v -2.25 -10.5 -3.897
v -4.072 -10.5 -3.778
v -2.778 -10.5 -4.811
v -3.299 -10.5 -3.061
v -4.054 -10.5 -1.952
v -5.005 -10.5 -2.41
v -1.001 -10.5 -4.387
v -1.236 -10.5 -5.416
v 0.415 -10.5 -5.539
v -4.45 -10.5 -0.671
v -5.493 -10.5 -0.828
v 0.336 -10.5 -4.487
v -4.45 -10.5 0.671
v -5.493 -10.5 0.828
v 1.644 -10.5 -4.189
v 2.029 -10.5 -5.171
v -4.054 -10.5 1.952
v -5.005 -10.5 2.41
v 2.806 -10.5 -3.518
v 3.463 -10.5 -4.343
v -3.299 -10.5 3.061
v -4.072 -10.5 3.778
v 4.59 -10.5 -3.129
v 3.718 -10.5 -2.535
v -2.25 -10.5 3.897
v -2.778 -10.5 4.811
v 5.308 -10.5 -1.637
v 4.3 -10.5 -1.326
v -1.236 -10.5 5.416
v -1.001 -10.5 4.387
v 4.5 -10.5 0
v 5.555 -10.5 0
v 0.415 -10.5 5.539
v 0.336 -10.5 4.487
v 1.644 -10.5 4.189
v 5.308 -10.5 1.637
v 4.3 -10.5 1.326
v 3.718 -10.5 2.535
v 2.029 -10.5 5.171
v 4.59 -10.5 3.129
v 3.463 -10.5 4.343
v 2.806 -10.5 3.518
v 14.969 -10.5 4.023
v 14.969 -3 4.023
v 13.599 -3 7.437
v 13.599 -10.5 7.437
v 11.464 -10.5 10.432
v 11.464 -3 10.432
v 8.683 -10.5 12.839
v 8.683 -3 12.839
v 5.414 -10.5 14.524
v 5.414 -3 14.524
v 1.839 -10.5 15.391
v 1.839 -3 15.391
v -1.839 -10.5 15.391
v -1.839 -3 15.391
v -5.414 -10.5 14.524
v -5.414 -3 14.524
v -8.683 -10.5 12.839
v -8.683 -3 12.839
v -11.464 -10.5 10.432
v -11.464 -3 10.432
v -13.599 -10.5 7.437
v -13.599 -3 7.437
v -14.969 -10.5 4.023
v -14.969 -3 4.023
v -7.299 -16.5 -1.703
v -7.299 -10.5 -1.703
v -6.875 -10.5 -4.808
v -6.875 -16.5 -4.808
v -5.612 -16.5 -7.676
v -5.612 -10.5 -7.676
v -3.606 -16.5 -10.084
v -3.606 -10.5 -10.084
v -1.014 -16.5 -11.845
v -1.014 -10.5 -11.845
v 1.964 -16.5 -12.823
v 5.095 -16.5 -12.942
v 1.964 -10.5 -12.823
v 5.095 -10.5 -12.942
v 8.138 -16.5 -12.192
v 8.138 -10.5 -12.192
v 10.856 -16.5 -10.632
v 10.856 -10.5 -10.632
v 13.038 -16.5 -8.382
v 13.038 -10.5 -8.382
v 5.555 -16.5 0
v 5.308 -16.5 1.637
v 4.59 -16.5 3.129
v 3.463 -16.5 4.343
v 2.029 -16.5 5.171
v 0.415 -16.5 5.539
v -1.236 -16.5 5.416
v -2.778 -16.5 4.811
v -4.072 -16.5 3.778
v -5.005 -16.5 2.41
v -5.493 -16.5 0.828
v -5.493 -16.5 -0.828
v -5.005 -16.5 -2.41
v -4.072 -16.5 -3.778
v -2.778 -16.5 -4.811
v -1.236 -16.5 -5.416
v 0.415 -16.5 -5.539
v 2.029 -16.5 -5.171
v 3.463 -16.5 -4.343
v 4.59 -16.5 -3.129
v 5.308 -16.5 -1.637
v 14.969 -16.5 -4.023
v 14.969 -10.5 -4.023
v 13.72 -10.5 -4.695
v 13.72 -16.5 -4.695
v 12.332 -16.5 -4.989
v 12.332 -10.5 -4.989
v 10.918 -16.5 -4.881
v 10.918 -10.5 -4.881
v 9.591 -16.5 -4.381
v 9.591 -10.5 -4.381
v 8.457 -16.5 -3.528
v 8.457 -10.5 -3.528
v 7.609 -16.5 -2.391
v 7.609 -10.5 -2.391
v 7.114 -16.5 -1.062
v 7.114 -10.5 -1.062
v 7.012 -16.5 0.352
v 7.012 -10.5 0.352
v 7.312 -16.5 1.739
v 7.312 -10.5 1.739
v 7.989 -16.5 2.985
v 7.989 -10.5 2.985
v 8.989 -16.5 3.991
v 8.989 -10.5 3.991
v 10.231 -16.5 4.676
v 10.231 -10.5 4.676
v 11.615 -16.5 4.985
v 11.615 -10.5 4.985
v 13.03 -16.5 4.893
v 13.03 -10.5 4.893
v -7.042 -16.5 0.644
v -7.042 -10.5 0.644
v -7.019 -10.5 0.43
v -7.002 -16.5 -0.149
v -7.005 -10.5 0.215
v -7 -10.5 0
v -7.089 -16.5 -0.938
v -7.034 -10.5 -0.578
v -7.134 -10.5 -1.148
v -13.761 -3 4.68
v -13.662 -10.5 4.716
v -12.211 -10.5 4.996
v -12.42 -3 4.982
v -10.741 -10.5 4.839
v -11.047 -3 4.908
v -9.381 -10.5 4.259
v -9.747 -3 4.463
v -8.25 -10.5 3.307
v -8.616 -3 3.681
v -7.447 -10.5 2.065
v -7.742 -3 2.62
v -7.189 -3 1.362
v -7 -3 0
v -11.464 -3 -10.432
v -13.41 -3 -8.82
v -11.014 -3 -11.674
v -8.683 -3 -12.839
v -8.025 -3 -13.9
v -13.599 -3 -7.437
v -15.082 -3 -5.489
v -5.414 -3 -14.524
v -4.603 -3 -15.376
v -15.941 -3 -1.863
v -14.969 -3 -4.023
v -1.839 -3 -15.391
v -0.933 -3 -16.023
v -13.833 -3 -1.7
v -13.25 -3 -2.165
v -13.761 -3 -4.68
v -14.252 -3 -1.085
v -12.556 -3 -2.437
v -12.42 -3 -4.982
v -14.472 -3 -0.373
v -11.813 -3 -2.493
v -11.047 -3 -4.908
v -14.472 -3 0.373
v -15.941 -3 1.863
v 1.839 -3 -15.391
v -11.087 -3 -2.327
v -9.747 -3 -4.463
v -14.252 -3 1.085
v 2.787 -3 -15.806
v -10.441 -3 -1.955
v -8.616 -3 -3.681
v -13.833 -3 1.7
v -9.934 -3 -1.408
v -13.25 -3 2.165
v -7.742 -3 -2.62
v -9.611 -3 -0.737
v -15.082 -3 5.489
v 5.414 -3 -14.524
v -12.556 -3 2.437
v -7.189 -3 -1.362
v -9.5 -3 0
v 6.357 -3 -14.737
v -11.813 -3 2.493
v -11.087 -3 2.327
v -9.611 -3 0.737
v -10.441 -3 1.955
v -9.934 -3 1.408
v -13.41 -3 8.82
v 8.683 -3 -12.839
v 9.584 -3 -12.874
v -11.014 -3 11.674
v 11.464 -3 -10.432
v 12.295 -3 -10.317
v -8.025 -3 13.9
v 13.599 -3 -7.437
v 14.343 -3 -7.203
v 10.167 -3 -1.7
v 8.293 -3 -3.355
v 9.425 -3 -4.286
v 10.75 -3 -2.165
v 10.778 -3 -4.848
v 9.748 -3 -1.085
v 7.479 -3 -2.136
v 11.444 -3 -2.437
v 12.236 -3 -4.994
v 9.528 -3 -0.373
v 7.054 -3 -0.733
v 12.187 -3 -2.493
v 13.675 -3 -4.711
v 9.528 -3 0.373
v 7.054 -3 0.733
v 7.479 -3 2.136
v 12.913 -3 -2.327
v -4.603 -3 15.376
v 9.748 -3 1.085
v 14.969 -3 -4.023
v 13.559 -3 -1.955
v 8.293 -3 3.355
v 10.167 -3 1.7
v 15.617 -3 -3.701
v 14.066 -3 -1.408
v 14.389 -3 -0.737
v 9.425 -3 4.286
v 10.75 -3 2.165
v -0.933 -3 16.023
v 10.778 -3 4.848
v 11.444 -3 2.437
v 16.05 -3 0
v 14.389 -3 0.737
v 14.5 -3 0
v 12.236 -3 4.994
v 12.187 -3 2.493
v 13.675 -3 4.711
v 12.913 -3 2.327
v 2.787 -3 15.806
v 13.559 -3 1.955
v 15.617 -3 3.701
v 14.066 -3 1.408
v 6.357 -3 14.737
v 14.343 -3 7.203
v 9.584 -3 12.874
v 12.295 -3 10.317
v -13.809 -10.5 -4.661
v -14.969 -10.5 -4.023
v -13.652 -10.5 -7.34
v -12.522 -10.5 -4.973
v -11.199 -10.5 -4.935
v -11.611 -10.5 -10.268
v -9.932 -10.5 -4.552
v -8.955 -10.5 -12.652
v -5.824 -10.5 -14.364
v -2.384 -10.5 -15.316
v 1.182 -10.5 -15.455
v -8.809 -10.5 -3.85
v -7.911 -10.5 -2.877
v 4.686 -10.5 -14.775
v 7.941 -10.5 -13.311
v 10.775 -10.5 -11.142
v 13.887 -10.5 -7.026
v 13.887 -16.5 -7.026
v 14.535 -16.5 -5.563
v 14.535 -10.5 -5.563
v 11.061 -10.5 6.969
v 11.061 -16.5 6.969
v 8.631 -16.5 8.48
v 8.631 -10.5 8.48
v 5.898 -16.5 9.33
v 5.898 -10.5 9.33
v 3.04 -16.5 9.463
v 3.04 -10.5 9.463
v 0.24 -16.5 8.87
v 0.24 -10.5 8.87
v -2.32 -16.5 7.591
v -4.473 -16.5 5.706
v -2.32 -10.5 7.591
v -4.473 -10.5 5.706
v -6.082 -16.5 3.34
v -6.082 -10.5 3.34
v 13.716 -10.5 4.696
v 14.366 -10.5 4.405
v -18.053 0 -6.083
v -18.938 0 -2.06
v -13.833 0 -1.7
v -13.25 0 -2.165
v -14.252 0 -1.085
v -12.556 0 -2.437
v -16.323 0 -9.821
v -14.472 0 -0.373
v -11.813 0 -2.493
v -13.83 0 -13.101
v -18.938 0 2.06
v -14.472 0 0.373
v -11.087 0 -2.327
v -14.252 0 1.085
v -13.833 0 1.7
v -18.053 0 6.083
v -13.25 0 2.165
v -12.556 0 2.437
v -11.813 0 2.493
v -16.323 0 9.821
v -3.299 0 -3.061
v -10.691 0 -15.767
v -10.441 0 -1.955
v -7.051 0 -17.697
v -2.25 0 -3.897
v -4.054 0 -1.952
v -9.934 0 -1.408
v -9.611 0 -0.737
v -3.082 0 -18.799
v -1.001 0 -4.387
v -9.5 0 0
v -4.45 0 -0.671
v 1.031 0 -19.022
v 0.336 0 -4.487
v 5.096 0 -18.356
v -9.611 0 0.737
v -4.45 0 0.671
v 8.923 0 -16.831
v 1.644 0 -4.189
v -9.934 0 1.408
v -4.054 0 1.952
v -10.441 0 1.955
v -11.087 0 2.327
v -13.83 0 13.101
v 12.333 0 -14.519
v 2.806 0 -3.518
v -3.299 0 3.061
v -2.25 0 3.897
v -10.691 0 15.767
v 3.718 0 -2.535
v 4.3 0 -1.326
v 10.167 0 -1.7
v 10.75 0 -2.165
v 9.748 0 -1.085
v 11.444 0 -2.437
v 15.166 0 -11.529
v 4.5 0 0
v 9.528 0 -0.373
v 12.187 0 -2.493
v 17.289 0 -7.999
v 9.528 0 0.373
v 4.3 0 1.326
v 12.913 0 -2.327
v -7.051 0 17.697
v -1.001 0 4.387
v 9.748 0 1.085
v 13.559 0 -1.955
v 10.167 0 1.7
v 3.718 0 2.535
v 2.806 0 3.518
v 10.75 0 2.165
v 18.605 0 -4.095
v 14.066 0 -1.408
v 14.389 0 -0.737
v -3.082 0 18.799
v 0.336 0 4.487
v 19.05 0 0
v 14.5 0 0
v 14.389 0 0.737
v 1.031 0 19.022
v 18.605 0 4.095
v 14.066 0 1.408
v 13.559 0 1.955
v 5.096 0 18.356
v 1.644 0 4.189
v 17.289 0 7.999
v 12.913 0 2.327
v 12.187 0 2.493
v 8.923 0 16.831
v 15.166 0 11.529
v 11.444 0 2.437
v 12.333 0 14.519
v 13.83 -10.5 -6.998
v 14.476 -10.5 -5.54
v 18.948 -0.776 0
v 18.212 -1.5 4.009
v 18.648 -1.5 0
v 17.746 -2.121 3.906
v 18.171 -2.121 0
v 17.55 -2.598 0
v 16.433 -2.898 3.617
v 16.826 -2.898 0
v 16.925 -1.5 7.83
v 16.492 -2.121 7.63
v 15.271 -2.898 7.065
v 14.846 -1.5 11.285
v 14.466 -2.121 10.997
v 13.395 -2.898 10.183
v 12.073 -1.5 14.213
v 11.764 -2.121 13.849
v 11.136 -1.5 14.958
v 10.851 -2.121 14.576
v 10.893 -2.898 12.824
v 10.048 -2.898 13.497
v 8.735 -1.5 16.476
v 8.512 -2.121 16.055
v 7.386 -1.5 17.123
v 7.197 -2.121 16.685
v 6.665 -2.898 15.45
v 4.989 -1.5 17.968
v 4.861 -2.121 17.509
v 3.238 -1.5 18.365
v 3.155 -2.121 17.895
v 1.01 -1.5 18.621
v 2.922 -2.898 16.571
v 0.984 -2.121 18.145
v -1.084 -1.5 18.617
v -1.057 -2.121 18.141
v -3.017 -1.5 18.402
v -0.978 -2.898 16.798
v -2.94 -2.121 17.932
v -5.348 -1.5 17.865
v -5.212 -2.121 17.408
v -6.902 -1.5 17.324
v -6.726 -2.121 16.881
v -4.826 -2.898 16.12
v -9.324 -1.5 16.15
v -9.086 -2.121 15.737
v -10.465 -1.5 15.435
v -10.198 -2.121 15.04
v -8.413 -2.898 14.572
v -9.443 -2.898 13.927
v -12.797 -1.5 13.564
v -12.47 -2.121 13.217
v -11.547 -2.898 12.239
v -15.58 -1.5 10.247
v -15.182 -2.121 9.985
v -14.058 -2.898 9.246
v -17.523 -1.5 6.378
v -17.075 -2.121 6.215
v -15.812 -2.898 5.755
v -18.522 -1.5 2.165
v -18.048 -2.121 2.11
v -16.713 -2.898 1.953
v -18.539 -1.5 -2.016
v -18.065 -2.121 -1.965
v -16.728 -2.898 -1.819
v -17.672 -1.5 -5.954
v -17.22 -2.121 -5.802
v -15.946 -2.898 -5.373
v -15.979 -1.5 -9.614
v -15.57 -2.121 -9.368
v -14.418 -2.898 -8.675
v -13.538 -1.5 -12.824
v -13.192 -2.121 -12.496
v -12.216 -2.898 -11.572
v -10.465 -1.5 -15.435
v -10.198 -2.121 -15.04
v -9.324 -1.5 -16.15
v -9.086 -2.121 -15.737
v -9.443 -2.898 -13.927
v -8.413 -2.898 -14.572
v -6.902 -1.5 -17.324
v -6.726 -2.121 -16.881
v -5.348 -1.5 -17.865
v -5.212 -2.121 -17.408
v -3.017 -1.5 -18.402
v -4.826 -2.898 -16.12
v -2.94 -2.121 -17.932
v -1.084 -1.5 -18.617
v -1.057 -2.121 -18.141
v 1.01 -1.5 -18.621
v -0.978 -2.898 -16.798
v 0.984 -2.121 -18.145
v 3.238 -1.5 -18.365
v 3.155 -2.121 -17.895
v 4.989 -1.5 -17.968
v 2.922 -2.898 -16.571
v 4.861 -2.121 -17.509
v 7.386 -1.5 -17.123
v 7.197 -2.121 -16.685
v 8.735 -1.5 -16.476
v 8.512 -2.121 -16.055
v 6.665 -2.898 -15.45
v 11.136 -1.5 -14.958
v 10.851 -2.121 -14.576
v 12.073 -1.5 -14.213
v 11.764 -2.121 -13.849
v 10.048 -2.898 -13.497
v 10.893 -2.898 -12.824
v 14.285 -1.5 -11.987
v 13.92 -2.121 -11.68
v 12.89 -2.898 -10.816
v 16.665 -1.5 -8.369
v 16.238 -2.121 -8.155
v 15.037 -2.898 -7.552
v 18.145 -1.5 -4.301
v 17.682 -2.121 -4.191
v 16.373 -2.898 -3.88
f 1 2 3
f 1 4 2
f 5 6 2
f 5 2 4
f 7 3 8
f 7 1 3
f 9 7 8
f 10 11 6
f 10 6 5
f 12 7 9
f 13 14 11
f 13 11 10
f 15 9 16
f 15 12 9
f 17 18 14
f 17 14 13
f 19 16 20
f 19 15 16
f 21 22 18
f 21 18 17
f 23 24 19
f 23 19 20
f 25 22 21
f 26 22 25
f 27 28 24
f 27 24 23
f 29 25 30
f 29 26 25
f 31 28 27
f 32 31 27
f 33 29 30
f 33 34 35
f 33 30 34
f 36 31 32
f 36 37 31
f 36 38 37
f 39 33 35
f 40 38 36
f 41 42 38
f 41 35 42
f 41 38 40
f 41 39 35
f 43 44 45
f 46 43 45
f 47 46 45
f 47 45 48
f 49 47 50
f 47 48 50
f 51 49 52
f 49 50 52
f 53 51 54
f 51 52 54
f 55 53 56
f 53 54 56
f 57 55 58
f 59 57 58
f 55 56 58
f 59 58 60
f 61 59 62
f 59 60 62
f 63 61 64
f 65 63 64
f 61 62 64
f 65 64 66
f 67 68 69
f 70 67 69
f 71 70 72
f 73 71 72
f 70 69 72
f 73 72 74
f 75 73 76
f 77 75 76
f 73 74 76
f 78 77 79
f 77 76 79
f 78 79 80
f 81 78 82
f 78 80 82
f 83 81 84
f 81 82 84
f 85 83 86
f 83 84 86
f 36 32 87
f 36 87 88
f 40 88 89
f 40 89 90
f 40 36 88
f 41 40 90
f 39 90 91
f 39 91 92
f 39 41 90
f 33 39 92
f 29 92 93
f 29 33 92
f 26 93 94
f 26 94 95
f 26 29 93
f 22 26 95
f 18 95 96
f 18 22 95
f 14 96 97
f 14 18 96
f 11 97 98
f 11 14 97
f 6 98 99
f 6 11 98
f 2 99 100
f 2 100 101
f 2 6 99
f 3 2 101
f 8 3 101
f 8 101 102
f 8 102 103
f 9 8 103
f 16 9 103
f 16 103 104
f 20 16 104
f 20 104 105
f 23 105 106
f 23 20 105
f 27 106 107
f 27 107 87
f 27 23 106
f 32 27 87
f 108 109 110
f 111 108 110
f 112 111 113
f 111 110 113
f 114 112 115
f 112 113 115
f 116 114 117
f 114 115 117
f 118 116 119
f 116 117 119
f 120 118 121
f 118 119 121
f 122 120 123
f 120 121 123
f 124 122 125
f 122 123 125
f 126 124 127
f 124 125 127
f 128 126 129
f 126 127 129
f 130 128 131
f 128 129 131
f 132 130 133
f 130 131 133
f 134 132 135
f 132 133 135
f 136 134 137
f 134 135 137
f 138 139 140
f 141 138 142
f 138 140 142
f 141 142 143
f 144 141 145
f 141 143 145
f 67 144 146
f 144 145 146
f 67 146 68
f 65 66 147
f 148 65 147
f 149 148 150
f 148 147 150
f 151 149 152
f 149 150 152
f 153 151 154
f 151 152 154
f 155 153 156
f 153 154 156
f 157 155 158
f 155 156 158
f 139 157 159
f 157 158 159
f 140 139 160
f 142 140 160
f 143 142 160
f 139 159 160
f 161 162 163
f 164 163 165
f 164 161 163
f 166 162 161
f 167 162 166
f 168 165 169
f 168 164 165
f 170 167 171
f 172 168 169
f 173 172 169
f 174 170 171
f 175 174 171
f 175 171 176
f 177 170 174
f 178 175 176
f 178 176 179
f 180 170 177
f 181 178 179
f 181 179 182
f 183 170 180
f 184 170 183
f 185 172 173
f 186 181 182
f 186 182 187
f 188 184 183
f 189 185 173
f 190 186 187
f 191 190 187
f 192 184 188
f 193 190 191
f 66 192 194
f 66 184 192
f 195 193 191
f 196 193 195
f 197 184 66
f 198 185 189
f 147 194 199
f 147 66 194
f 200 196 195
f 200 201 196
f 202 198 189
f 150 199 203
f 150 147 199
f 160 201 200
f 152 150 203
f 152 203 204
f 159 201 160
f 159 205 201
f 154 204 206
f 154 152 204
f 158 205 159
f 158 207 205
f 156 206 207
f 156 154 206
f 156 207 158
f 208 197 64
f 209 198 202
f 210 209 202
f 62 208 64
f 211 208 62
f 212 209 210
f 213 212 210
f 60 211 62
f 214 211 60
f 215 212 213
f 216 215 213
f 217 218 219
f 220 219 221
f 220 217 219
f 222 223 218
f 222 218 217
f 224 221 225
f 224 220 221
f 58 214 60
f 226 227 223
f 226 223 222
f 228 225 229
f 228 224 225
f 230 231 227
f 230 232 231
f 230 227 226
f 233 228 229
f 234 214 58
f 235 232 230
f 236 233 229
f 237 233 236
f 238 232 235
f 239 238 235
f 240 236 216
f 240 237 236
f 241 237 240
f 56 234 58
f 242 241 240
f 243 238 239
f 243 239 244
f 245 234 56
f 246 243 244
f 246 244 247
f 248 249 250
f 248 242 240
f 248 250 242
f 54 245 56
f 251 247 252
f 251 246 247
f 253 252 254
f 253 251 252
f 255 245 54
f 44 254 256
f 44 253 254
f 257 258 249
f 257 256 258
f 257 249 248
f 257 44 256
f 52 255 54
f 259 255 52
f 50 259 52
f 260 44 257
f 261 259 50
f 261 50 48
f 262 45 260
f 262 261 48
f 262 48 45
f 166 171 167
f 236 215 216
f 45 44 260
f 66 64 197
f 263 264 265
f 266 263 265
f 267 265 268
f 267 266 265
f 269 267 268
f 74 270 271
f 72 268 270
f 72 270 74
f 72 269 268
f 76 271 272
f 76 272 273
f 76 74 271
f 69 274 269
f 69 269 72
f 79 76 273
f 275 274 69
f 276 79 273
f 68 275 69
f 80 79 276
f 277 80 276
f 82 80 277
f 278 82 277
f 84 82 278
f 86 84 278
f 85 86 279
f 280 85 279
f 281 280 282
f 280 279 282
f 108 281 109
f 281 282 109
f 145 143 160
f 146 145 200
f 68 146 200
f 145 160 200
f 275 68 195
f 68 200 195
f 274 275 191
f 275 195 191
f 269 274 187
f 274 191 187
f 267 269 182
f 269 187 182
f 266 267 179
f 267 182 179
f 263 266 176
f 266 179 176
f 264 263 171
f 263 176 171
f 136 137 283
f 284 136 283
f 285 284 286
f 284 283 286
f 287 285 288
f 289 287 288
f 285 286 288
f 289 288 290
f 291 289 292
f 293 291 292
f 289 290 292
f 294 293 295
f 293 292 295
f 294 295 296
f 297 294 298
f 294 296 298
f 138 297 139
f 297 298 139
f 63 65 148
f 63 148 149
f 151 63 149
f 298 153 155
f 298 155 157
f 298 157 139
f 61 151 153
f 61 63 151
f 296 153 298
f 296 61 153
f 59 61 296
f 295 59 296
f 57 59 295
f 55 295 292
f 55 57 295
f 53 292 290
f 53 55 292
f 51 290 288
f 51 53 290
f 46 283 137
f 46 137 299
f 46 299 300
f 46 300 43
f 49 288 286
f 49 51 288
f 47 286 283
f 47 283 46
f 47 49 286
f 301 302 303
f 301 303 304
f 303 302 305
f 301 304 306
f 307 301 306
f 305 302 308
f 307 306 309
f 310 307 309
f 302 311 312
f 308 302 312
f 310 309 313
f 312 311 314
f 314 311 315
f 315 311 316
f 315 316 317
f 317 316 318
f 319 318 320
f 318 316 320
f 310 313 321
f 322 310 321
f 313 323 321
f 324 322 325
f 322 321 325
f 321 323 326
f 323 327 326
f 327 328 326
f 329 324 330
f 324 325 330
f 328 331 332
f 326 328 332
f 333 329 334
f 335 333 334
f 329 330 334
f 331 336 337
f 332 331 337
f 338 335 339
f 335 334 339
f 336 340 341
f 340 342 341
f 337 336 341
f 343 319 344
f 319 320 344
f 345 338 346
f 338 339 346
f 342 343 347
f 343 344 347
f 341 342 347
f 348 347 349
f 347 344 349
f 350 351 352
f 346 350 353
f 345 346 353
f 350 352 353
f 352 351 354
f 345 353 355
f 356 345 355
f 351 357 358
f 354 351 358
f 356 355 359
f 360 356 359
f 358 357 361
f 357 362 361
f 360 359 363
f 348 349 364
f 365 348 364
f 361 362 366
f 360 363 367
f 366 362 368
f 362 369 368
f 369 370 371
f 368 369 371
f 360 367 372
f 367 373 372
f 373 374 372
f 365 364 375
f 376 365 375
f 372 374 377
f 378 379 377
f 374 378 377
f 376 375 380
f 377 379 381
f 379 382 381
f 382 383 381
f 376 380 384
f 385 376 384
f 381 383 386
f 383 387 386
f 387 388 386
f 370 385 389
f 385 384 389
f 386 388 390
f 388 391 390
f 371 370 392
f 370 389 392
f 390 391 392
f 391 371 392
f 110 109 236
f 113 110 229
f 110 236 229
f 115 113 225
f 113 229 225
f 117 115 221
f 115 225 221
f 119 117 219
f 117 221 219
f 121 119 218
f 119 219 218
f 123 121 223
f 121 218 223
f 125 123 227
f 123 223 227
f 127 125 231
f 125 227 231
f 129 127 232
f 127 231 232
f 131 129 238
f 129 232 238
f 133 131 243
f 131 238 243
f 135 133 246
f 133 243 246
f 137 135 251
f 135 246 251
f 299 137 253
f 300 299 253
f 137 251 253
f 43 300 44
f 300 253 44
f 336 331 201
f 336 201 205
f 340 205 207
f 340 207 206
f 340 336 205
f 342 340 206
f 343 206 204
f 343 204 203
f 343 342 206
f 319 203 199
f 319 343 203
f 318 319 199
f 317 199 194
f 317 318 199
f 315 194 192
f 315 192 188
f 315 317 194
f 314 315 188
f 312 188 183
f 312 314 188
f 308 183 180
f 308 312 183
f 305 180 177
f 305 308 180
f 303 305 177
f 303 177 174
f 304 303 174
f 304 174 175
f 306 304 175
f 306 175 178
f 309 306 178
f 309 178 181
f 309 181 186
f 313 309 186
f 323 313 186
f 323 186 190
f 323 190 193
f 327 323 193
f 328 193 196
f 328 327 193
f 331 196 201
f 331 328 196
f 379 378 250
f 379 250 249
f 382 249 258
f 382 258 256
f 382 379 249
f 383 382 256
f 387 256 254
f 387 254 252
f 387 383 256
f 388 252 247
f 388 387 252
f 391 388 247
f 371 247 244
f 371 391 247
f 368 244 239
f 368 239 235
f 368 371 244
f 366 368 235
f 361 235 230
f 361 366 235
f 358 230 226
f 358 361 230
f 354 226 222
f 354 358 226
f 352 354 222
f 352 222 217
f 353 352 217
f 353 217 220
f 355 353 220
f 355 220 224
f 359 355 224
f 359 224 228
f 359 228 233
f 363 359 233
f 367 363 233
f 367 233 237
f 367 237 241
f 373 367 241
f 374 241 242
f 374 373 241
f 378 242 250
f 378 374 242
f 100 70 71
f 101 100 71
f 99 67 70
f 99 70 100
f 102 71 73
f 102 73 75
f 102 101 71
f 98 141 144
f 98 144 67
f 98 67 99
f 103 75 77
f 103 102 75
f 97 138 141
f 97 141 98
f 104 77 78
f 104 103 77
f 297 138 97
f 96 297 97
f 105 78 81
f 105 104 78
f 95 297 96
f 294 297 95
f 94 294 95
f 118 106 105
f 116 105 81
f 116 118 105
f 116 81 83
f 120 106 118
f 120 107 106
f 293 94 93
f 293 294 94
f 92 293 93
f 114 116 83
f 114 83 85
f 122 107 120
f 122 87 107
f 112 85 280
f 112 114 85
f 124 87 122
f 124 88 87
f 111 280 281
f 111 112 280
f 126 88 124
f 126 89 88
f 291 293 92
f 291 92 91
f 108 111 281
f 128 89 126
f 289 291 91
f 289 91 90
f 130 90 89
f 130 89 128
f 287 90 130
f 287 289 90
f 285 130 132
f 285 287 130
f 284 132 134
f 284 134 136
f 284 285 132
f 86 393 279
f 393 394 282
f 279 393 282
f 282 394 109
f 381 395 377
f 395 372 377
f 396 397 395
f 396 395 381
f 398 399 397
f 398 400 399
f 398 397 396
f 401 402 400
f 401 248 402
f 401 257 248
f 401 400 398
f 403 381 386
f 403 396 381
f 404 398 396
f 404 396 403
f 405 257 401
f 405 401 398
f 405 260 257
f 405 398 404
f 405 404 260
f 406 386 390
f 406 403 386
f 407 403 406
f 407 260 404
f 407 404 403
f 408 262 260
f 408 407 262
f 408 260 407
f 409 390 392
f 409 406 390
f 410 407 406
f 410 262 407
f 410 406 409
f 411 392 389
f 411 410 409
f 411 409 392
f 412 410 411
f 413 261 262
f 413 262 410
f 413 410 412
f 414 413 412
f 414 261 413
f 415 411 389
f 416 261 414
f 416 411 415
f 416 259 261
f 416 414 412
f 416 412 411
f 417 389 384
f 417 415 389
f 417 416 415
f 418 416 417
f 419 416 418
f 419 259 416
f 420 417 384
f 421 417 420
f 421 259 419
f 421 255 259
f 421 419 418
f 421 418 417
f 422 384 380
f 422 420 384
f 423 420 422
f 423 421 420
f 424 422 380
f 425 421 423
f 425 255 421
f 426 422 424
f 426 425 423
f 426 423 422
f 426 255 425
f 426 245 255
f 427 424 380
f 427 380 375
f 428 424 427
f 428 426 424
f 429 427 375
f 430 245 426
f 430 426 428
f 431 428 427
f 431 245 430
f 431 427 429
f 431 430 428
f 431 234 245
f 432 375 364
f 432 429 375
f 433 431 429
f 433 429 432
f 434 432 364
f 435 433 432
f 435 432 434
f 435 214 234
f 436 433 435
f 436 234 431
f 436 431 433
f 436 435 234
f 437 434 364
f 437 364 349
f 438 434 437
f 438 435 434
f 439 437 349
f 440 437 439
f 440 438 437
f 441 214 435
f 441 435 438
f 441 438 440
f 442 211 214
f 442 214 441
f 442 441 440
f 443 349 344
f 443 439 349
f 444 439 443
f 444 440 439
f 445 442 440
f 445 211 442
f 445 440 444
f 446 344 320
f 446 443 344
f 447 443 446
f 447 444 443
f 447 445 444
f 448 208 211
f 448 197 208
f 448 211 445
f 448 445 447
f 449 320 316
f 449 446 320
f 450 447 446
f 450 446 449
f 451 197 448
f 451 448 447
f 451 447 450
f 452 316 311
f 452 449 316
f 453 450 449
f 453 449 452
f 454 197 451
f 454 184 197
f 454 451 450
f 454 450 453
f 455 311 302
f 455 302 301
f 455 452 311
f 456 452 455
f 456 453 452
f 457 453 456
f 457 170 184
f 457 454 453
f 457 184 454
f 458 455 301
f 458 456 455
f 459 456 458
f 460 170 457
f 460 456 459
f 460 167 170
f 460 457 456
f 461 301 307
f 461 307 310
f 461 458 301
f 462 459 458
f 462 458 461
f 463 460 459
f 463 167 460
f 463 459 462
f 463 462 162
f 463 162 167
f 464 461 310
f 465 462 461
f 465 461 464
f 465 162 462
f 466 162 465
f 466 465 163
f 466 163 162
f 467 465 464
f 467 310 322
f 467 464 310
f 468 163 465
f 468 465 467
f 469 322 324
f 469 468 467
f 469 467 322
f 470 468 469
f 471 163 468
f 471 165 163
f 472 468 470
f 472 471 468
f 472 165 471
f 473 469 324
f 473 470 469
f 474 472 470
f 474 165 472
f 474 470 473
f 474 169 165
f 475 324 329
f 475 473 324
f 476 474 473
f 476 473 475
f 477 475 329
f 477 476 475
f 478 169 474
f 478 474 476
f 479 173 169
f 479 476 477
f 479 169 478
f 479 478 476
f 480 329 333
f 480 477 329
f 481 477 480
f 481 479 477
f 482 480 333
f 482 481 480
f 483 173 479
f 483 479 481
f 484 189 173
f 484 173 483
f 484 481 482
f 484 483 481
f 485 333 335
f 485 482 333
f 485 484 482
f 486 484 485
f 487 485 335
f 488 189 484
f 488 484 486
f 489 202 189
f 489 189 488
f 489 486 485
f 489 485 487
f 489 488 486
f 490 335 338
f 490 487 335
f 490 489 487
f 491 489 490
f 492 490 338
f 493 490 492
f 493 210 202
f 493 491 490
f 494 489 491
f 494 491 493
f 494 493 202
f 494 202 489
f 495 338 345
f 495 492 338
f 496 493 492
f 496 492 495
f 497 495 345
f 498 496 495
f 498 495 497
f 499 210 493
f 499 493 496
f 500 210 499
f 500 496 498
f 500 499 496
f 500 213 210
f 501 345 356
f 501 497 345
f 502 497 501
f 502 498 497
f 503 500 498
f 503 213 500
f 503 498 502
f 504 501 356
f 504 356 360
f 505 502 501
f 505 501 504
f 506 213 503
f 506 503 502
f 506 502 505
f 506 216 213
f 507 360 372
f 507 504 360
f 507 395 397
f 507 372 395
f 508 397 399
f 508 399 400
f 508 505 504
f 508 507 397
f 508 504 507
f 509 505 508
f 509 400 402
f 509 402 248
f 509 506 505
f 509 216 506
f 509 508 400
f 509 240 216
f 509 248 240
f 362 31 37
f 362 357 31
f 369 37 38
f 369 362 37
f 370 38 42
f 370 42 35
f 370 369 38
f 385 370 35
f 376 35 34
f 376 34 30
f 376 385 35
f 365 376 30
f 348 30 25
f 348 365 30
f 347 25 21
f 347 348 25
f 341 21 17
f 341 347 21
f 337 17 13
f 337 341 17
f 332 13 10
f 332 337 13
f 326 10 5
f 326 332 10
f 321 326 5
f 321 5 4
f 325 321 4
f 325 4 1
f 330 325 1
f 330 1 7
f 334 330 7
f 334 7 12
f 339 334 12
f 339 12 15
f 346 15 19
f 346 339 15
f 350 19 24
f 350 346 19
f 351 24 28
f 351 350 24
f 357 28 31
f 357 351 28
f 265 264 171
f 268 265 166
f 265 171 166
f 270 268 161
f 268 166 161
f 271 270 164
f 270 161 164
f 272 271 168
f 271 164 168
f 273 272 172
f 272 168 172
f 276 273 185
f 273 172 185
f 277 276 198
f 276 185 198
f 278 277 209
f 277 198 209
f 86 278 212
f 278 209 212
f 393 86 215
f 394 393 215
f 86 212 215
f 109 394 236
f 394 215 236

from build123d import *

# Parameters (mm, degrees)
F0_R     = 19.05
F0_R_2   = 2.5
F0_R_3   = 4.5
F1_DEPTH = 3
F2_R     = 2.99999
F3_R     = 4.5
F4_DEPTH = 7.5
F5_R     = 5.555
F6_DEPTH = 6


# Not quite as in the source:
# - a fillet or chamfer is up to 0.001 mm smaller than in the source, because OpenCascade refuses the exact size


with BuildPart() as f1:
    # F0 (on Front) → F1 (new body)
    with BuildSketch(Plane.XZ):
        Circle(F0_R)
        with Locations((-12, 0)):
            Circle(F0_R_2, mode=Mode.SUBTRACT)
        Circle(F0_R_3, mode=Mode.SUBTRACT)
        with Locations((12, 0)):
            Circle(F0_R_2, mode=Mode.SUBTRACT)
    extrude(amount=F1_DEPTH)

    # F2 (radius 3 in the source; OpenCascade refuses exactly that, so slightly less here)
    f2_edges = [f1.edges().sort_by_distance(p)[0] for p in [
        (-19.05, -3, 0),
    ]]
    fillet(f2_edges, radius=F2_R)

    # F3 (on face) → F4 (join)
    with BuildSketch(Plane.XZ.offset(3)):
        with BuildLine():
            ThreePointArc((14.96875, -4.0232478717), (7, 0), (14.96875, 4.0232478717))
            ThreePointArc((14.96875, 4.0232478717), (0, 15.5), (-14.96875, 4.0232478717))
            ThreePointArc((-14.96875, 4.0232478717), (-9.7465304528, 4.4633927678), (-7, 0))
            ThreePointArc((-7, 0), (-9.7465304528, -4.4633927678), (-14.96875, -4.0232478717))
            ThreePointArc((-14.96875, -4.0232478717), (0, -15.5), (14.96875, -4.0232478717))
        make_face()
        Circle(F3_R, mode=Mode.SUBTRACT)
    extrude(amount=F4_DEPTH)

    # F5 (on face) → F6 (join)
    with BuildSketch(Plane.XZ.offset(10.5)):
        with BuildLine():
            ThreePointArc((13.0379586998, -8.3822212416), (14.2369080678, -6.3061863212), (14.96875, -4.0232478717))
            ThreePointArc((14.96875, -4.0232478717), (14.1719474758, -6.2774122648), (13.0379586998, -8.3822212416))
        make_face()
        with BuildLine():
            ThreePointArc((13.0379586998, -8.3822212416), (14.1719474758, -6.2774122648), (14.96875, -4.0232478717))
            ThreePointArc((14.96875, -4.0232478717), (7.1141405648, -1.0622511849), (13.0303045981, 4.8926958249))
            ThreePointArc((13.0303045981, 4.8926958249), (1.6209007027, 9.2560887381), (-7.0415959869, 0.6436067458))
            ThreePointArc((-7.0415959869, 0.6436067458), (-7.0298229821, -0.5452892911), (-7.2990861299, -1.7033522202))
            ThreePointArc((-7.2990861299, -1.7033522202), (0.4406594059, -12.4383718384), (13.0379586998, -8.3822212416))
        make_face()
        Circle(F5_R, mode=Mode.SUBTRACT)
    extrude(amount=F6_DEPTH)


solid = f1.part
